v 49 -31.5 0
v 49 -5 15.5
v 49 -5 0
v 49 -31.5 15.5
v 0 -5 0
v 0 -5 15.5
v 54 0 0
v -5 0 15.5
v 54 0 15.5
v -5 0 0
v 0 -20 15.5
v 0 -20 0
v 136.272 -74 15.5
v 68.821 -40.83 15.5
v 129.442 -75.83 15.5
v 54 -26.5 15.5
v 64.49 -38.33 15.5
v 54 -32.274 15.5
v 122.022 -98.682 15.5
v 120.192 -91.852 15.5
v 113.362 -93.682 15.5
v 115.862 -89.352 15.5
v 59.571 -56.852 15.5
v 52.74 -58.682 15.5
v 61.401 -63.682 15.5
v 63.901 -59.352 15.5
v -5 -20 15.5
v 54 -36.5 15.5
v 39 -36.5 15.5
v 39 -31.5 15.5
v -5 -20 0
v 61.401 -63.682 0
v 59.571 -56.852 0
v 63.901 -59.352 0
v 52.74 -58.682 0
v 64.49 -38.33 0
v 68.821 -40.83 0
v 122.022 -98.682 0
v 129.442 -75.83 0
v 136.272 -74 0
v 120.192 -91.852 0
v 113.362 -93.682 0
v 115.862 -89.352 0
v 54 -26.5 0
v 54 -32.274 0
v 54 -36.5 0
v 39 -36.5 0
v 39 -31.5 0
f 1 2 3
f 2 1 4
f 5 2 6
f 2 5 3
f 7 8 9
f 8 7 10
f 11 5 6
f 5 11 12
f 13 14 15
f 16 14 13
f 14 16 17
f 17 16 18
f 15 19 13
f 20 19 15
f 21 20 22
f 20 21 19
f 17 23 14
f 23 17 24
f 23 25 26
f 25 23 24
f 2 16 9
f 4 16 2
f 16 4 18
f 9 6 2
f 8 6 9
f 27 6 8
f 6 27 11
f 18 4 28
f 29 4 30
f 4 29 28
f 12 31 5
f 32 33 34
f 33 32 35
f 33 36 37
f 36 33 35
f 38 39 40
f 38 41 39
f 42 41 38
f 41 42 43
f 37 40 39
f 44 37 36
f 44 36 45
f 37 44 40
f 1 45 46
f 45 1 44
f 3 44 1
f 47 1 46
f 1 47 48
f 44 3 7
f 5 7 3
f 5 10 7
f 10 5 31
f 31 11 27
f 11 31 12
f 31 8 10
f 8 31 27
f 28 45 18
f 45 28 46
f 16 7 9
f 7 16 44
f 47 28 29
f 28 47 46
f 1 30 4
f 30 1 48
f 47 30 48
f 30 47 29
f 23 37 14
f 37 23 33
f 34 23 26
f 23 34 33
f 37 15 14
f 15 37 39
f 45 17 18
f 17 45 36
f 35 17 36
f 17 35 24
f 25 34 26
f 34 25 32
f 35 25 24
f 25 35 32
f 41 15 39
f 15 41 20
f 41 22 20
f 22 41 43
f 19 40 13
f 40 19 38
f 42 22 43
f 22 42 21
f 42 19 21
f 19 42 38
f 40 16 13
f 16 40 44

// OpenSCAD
// [FL_INDEX: keywords="openscad, 3d_parametric, Parametric_Sixaxis_Phone_Clip, csg_solid" | COT="Parametric OpenSCAD design from 3DCodeverse"]
// Title: Parametric Sixaxis Phone Clip

// Simple Sixaxis Phone or Tablet Holder
// (c) 2013, Christopher "ScribbleJ" Jansen


/* [SixAxis] */

// Thickness of the entire clip
six_clip_thick = 5;
// Width of entire clip
six_clip_w = 15.5;

// Thickness of Sixaxis Controller
six_clip_d = 26.5;
// Depth of clip on front side
six_clip_db = 15;
// Length of Sixaxis Controller
six_clip_l  = 49;
// Length of clip on top of Sixaxis
six_t_overlap = 10;

/* [Phone] */

// How far we cover the front of the phone
phone_clip_overlap = 5;
// Thickness of the phone
phone_clip_d = 18.5;
// Length or Width of the phone
phone_clip_l = 70;
// Angle of Phone to Sixaxis
phone_clip_ang = 30;
// Phone clip distance from Sixaxis
phone_clip_extra = 20;
// Where to attach the phone clip on Sixaxis clip
phone_clip_attach = six_clip_d;

rotate([90,0,0])
{
  color("green") six();
  translate([six_clip_l+six_clip_thick,0,phone_clip_attach]) rotate([0,-phone_clip_ang,0]) phone();
}


module phone()
{
  cube([phone_clip_l + phone_clip_extra + six_clip_thick, six_clip_w, six_clip_thick]);
  translate([phone_clip_extra-six_clip_thick,0,six_clip_thick]) phone_arm();
  translate([phone_clip_extra + phone_clip_l + six_clip_thick,0,six_clip_thick]) mirror([1,0,0]) phone_arm();

}
module phone_arm()
{
  cube([six_clip_thick, six_clip_w, phone_clip_d]);
  translate([0,0,phone_clip_d]) cube([six_clip_thick + phone_clip_overlap, six_clip_w, six_clip_thick]);
}

module six()
{
      // underside
      cube([six_clip_l, six_clip_w, six_clip_thick]);    
      // front
      translate([-six_clip_thick,0,0]) cube([six_clip_thick, six_clip_w, six_clip_thick + six_clip_db]);
      // back of sixaxis
      translate([six_clip_l,0,0]) cube([six_clip_thick, six_clip_w, six_clip_thick *2  + six_clip_d]);
      // top of sixaxis
      translate([six_clip_l - six_t_overlap,0,six_clip_thick + six_clip_d]) cube([six_t_overlap, six_clip_w, six_clip_thick]);
}
